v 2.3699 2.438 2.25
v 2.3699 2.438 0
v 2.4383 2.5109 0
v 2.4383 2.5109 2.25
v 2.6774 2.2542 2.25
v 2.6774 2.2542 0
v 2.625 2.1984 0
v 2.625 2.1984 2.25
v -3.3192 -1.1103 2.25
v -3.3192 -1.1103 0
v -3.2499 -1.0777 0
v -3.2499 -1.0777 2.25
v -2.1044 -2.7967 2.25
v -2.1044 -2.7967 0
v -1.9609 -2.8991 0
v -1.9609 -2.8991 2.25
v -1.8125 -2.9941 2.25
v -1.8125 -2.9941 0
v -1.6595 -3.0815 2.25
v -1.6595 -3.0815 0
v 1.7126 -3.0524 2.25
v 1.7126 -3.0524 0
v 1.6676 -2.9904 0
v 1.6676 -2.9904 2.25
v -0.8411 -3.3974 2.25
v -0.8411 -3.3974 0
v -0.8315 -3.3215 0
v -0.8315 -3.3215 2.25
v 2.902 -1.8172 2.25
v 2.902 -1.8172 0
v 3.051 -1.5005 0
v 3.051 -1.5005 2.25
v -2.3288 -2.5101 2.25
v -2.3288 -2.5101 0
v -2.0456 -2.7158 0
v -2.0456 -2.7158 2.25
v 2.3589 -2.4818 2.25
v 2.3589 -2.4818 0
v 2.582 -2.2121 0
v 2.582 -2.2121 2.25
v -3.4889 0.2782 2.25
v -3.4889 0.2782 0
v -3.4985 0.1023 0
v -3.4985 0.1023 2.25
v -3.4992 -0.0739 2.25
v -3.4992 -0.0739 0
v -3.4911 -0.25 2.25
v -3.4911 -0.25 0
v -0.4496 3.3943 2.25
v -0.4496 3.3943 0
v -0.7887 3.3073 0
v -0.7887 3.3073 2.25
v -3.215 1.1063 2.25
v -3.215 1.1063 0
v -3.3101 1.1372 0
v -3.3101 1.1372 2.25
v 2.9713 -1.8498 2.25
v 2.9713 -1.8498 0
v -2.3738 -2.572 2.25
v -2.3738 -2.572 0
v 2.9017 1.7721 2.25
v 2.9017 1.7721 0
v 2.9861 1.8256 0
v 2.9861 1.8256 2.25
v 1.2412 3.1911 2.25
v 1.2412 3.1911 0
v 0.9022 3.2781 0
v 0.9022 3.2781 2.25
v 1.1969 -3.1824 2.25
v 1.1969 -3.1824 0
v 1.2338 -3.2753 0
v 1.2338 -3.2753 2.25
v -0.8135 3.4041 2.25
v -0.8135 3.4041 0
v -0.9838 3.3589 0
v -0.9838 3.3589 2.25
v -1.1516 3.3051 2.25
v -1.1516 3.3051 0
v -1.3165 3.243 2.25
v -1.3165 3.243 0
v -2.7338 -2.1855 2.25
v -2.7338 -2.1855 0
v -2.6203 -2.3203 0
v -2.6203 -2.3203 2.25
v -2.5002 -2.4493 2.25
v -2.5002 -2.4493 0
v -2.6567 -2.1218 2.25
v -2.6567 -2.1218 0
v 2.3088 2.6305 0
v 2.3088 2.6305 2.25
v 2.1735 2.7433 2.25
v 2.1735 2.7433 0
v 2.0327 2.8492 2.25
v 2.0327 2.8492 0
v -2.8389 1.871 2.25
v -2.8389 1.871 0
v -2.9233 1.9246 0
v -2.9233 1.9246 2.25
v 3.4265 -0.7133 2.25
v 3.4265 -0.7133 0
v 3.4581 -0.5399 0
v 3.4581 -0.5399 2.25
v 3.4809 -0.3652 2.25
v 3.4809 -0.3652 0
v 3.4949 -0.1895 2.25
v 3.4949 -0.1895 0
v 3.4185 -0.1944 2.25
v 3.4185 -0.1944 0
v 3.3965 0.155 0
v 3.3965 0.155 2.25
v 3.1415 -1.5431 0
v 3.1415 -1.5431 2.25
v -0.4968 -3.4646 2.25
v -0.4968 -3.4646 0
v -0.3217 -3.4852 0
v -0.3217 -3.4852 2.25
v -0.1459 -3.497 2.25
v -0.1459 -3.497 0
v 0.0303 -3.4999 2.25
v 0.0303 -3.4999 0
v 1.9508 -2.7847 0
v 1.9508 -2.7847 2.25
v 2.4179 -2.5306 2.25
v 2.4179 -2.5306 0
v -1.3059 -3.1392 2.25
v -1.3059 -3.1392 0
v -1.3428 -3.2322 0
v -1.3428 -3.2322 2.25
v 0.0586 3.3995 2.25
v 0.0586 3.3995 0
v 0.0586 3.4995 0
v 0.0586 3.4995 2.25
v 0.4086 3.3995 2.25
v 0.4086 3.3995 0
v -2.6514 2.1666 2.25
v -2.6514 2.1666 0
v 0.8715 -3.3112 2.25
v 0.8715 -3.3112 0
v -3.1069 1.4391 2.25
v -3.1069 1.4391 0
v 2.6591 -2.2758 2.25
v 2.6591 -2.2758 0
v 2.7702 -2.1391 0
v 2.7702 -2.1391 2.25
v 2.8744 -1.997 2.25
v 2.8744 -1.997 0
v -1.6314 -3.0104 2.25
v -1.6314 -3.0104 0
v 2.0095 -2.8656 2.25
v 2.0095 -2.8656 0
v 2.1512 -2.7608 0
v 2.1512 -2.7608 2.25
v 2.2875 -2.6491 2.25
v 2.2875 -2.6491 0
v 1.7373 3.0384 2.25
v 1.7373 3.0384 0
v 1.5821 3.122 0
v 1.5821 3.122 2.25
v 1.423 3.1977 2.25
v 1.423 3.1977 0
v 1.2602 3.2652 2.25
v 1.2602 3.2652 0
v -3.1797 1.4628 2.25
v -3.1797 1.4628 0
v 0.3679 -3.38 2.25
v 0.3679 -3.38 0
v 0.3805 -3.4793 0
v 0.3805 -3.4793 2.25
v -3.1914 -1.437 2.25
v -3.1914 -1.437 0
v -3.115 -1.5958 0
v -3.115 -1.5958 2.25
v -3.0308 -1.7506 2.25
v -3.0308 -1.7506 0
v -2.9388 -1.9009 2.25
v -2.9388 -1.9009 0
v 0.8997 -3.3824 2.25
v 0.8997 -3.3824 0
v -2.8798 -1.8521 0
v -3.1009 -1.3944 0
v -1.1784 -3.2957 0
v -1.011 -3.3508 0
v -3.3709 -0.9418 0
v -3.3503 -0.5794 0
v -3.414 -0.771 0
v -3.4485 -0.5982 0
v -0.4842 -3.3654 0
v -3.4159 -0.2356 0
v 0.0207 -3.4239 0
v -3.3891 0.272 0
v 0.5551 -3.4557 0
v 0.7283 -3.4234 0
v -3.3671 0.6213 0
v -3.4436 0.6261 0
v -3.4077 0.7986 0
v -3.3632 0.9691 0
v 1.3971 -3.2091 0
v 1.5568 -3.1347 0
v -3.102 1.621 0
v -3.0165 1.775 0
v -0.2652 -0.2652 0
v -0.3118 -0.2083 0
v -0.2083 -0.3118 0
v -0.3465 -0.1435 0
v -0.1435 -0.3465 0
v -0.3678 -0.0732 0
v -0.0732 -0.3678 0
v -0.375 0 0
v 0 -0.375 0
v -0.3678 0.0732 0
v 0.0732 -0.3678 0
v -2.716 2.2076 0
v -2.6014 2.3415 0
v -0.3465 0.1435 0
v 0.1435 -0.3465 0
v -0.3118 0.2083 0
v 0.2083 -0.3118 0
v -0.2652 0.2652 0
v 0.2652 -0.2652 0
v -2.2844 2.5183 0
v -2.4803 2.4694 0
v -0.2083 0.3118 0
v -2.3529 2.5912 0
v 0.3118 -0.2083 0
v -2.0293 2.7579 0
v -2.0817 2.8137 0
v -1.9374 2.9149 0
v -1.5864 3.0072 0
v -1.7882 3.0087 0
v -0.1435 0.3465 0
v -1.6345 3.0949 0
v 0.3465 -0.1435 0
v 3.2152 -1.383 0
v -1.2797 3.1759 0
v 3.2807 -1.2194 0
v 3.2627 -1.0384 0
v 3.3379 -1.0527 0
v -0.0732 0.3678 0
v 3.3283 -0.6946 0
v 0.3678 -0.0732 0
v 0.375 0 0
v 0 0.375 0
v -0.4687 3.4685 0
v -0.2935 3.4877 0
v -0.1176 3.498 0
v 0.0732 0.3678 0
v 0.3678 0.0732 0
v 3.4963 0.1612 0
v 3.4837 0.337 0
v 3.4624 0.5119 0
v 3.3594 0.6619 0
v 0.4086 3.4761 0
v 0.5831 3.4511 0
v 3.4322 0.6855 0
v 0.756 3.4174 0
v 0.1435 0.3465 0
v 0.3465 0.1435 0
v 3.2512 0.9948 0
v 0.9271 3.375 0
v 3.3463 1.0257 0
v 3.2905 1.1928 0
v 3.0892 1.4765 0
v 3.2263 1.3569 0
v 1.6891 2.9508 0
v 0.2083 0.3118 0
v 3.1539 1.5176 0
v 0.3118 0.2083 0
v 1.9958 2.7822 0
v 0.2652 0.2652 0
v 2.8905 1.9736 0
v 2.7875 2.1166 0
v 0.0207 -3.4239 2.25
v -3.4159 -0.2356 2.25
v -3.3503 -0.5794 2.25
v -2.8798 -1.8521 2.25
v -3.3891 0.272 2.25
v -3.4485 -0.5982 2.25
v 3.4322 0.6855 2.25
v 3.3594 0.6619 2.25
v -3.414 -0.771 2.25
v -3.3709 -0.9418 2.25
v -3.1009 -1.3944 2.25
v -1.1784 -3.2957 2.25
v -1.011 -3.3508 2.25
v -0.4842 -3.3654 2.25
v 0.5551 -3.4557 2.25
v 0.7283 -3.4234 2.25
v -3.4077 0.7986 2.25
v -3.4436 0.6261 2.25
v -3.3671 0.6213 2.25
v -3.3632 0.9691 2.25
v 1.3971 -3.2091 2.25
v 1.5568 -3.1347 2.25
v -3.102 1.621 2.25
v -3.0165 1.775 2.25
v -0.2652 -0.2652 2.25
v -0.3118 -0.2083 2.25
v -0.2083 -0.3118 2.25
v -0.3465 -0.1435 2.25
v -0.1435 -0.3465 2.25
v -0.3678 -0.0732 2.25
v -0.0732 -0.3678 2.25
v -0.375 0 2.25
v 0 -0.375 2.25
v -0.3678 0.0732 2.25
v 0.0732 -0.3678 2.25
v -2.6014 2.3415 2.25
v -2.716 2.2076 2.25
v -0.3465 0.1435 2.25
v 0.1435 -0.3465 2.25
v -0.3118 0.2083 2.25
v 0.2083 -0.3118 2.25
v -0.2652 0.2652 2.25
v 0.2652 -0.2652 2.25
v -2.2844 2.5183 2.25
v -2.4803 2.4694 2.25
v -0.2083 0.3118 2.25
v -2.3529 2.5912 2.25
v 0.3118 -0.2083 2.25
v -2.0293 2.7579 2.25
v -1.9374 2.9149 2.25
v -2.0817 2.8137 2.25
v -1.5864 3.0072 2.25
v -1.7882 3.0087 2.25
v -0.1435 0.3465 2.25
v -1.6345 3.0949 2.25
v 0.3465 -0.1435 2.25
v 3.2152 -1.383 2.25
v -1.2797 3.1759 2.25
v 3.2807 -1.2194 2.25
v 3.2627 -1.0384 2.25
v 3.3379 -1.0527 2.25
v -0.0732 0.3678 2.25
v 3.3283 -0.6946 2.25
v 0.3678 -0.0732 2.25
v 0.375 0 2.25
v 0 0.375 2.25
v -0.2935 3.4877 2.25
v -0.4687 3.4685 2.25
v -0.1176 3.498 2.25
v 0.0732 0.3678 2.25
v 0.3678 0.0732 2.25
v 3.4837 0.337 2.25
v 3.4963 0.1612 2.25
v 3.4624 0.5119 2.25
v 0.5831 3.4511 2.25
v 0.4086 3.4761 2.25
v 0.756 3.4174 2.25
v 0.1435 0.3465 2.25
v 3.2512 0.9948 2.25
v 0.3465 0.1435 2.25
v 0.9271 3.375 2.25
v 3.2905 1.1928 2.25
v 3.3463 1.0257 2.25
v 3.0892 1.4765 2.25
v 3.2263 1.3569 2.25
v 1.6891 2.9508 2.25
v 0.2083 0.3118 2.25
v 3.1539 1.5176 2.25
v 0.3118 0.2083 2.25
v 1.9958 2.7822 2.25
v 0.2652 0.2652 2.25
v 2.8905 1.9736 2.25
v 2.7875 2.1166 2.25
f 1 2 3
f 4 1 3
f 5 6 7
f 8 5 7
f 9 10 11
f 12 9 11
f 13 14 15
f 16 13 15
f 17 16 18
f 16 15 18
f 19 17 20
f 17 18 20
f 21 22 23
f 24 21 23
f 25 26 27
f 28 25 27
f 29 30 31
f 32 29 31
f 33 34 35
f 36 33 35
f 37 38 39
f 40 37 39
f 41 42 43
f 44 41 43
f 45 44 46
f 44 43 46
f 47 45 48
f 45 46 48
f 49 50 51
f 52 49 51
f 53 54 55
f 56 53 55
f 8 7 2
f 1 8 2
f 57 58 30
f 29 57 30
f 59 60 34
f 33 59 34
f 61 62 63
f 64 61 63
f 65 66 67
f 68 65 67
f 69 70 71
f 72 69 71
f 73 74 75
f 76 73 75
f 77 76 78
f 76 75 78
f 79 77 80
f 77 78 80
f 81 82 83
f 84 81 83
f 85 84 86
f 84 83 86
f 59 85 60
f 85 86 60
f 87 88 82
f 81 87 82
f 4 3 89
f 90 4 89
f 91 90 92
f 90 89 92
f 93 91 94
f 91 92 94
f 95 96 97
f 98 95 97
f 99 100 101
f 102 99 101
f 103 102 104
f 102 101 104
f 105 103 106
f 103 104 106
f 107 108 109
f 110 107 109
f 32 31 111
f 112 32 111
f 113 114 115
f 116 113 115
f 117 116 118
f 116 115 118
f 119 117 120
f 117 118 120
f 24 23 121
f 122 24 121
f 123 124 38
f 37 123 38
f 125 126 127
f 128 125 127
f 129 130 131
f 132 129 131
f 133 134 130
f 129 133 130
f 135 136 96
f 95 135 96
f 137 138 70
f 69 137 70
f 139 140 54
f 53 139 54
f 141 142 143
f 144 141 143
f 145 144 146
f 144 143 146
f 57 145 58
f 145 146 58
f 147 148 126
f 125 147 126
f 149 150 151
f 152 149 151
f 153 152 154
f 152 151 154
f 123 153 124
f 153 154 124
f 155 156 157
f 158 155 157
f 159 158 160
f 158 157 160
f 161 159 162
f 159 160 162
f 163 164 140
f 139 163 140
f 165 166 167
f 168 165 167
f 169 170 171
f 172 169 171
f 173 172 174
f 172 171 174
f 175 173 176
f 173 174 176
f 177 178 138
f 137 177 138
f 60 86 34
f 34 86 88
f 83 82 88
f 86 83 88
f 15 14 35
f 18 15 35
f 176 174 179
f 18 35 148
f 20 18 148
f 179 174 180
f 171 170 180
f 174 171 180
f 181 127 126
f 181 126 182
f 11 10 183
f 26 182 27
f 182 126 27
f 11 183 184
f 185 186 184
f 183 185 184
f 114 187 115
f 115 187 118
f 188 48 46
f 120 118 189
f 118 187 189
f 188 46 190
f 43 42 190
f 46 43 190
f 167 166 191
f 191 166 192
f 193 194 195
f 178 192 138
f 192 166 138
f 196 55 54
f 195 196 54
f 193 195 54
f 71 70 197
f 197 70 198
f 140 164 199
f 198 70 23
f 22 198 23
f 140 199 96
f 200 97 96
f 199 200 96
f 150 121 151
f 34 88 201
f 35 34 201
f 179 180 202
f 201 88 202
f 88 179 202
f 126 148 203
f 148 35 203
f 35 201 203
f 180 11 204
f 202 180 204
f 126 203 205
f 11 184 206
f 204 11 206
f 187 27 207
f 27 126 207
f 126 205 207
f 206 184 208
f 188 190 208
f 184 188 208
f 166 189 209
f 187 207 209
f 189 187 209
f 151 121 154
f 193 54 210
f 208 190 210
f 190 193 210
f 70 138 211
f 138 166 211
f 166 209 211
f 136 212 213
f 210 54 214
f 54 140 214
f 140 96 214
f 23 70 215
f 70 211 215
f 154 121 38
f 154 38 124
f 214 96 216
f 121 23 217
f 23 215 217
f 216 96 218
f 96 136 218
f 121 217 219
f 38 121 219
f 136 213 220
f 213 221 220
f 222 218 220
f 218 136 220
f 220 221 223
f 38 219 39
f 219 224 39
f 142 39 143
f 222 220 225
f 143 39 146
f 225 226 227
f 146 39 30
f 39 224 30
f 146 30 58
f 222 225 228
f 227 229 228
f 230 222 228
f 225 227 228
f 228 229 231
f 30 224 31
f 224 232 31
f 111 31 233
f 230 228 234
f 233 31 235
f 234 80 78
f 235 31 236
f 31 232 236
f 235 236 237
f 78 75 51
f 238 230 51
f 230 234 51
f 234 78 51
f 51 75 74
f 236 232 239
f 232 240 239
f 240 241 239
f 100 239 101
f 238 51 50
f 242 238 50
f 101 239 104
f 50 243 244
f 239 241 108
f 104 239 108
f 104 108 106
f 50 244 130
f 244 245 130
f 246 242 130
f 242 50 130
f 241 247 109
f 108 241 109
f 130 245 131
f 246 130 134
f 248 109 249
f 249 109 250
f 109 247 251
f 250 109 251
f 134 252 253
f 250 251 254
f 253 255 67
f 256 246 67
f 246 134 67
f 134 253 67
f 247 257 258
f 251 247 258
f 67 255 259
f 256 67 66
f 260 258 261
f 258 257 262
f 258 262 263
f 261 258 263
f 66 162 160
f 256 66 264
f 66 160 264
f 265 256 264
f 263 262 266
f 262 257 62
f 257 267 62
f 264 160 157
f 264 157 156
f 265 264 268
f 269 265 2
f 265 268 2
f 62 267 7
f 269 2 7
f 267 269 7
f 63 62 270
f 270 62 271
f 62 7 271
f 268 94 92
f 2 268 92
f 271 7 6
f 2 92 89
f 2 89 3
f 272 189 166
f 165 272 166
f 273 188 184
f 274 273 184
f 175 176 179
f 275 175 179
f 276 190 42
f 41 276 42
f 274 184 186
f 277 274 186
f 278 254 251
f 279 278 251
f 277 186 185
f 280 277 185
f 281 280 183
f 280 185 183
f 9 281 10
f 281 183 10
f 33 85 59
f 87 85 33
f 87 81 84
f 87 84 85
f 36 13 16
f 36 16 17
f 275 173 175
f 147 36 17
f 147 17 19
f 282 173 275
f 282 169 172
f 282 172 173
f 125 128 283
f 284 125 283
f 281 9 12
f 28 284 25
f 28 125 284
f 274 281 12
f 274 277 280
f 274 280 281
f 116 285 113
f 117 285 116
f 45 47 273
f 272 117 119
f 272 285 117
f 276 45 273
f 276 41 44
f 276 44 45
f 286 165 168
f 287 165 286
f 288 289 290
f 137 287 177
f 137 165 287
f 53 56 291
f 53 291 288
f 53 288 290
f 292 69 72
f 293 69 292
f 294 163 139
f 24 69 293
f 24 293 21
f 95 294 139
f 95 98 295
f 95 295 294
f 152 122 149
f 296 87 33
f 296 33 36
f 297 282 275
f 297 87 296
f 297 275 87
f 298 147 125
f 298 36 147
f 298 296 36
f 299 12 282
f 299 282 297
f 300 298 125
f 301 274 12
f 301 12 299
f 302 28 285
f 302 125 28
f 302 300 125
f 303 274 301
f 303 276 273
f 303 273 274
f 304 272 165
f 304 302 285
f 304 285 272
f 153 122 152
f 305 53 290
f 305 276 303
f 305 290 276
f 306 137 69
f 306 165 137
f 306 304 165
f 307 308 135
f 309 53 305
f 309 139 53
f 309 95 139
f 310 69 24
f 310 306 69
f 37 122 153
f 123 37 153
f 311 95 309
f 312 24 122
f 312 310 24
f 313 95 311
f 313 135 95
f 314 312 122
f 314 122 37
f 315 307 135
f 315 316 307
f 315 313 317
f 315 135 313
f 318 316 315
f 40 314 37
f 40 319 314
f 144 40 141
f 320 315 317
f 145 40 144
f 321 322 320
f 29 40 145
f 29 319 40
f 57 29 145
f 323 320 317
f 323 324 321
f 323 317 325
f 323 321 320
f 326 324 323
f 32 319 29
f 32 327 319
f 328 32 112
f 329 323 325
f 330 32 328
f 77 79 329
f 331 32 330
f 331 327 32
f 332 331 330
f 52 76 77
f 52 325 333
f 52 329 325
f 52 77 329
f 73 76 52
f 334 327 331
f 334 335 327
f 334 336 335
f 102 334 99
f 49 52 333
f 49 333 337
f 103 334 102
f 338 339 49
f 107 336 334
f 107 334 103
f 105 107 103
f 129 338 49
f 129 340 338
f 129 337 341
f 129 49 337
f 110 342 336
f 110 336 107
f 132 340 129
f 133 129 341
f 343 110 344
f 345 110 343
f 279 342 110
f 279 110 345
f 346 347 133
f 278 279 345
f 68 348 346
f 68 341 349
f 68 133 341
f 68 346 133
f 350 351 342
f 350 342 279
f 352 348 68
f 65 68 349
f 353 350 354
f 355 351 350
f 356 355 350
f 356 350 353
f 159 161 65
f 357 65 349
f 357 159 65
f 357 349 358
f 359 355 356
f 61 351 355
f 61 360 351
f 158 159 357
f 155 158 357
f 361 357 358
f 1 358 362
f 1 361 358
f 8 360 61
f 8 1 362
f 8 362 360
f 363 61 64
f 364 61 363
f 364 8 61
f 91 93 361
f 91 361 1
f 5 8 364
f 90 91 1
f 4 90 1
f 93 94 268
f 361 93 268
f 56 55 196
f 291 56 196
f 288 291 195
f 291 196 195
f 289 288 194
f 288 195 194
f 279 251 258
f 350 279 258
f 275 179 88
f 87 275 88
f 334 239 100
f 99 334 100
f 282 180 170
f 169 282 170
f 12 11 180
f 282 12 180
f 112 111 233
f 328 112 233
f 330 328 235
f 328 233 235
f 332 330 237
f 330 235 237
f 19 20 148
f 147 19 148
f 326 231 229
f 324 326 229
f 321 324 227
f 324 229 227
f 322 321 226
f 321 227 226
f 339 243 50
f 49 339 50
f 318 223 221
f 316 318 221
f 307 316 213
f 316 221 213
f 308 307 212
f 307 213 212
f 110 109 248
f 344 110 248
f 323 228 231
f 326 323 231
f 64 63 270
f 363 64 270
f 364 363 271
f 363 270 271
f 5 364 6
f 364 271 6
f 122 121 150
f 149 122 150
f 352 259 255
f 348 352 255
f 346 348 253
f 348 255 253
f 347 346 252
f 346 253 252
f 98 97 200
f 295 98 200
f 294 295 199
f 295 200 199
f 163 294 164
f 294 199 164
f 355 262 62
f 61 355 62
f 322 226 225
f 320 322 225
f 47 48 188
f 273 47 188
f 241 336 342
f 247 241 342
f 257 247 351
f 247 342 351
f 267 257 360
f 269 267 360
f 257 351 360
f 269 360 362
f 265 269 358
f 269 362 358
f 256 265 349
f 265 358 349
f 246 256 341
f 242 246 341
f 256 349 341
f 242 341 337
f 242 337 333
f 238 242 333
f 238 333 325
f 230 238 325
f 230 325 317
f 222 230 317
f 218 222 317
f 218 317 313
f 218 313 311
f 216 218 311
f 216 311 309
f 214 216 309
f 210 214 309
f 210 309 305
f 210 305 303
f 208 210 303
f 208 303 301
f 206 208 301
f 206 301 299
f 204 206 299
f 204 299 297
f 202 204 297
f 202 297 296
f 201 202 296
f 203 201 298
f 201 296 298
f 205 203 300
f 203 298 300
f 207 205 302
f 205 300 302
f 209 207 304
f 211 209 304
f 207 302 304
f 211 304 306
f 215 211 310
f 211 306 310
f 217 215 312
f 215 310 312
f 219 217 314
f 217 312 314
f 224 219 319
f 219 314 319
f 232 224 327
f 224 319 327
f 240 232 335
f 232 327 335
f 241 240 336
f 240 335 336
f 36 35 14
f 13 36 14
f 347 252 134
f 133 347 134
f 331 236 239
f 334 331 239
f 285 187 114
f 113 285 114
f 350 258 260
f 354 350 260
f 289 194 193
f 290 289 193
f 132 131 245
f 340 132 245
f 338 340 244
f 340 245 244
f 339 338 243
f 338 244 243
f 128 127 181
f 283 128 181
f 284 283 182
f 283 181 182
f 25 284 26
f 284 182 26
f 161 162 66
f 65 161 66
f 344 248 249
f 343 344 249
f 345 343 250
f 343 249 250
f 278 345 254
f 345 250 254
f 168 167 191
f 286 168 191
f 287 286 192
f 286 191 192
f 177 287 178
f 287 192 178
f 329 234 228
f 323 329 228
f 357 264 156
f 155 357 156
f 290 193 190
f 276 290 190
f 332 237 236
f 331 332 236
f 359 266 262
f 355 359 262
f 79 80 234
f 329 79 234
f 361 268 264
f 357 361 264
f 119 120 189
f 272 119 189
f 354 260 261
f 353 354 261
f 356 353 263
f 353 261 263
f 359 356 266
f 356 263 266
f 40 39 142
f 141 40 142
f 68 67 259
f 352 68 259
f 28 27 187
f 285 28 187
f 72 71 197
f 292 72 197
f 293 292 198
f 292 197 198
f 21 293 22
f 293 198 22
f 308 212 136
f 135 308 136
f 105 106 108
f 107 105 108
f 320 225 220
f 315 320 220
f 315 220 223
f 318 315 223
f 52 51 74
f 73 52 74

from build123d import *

# Parameters (mm, degrees)
F1_DEPTH = 2.25
F2_R     = 0.375
F3_DEPTH = 2.251


with BuildPart() as f1:
    # F0 (on Top) → F1 (new body)
    with BuildSketch(Plane.XY):
        with BuildLine():
            Line((3.396481, 0.154959), (3.496284, 0.161238))
            ThreePointArc((3.496284, 0.161238), (3.474149, 0.424604), (3.432204, 0.685549))
            Line((3.432204, 0.685549), (3.359394, 0.661892))
            Line((3.359394, 0.661892), (3.251238, 0.994762))
            Line((3.251238, 0.994762), (3.346343, 1.025663))
            ThreePointArc((3.346343, 1.025663), (3.259407, 1.27525), (3.153886, 1.517566))
            Line((3.153886, 1.517566), (3.089246, 1.476545))
            Line((3.089246, 1.476545), (2.901707, 1.772059))
            Line((2.901707, 1.772059), (2.98614, 1.825642))
            ThreePointArc((2.98614, 1.825642), (2.839865, 2.045768), (2.677397, 2.254228))
            Line((2.677397, 2.254228), (2.62499, 2.198421))
            Line((2.62499, 2.198421), (2.369851, 2.438012))
            Line((2.369851, 2.438012), (2.438306, 2.510909))
            ThreePointArc((2.438306, 2.510909), (2.241884, 2.687742), (2.032678, 2.849249))
            Line((2.032678, 2.849249), (1.995797, 2.782162))
            Line((1.995797, 2.782162), (1.689089, 2.950775))
            Line((1.689089, 2.950775), (1.737265, 3.038406))
            ThreePointArc((1.737265, 3.038406), (1.503037, 3.160835), (1.260238, 3.265241))
            Line((1.260238, 3.265241), (1.241199, 3.191089))
            Line((1.241199, 3.191089), (0.902195, 3.278131))
            Line((0.902195, 3.278131), (0.927064, 3.374989))
            ThreePointArc((0.927064, 3.374989), (0.669748, 3.435322), (0.408613, 3.476066))
            Line((0.408613, 3.476066), (0.408613, 3.399509))
            Line((0.408613, 3.399509), (0.058613, 3.399509))
            Line((0.058613, 3.399509), (0.058613, 3.499509))
            ThreePointArc((0.058613, 3.499509), (-0.205623, 3.493955), (-0.468687, 3.468477))
            Line((-0.468687, 3.468477), (-0.449648, 3.394325))
            Line((-0.449648, 3.394325), (-0.788652, 3.307284))
            Line((-0.788652, 3.307284), (-0.813521, 3.404142))
            ThreePointArc((-0.813521, 3.404142), (-1.068074, 3.333049), (-1.316537, 3.242951))
            Line((-1.316537, 3.242951), (-1.279656, 3.175864))
            Line((-1.279656, 3.175864), (-1.586363, 3.00725))
            Line((-1.586363, 3.00725), (-1.634538, 3.09488))
            ThreePointArc((-1.634538, 3.09488), (-1.863414, 2.962716), (-2.081665, 2.813658))
            Line((-2.081665, 2.813658), (-2.029258, 2.757851))
            Line((-2.029258, 2.757851), (-2.284397, 2.518259))
            Line((-2.284397, 2.518259), (-2.352852, 2.591156))
            ThreePointArc((-2.352852, 2.591156), (-2.541669, 2.406225), (-2.715994, 2.207573))
            Line((-2.715994, 2.207573), (-2.651355, 2.166552))
            Line((-2.651355, 2.166552), (-2.838894, 1.871037))
            Line((-2.838894, 1.871037), (-2.923327, 1.92462))
            ThreePointArc((-2.923327, 1.92462), (-3.060222, 1.698541), (-3.179667, 1.462778))
            Line((-3.179667, 1.462778), (-3.106857, 1.43912))
            Line((-3.106857, 1.43912), (-3.215013, 1.106251))
            Line((-3.215013, 1.106251), (-3.310119, 1.137152))
            ThreePointArc((-3.310119, 1.137152), (-3.386489, 0.884132), (-3.44355, 0.626071))
            Line((-3.44355, 0.626071), (-3.367144, 0.621264))
            Line((-3.367144, 0.621264), (-3.389121, 0.271954))
            Line((-3.389121, 0.271954), (-3.488923, 0.278234))
            ThreePointArc((-3.488923, 0.278234), (-3.499971, 0.01417), (-3.491062, -0.249974))
            Line((-3.491062, -0.249974), (-3.415861, -0.235629))
            Line((-3.415861, -0.235629), (-3.350278, -0.579429))
            Line((-3.350278, -0.579429), (-3.448506, -0.598168))
            ThreePointArc((-3.448506, -0.598168), (-3.393537, -0.856683), (-3.319218, -1.110313))
            Line((-3.319218, -1.110313), (-3.249947, -1.077716))
            Line((-3.249947, -1.077716), (-3.100924, -1.394406))
            Line((-3.100924, -1.394406), (-3.191407, -1.436984))
            ThreePointArc((-3.191407, -1.436984), (-3.073875, -1.673707), (-2.938815, -1.900886))
            Line((-2.938815, -1.900886), (-2.879827, -1.852087))
            Line((-2.879827, -1.852087), (-2.656728, -2.121766))
            Line((-2.656728, -2.121766), (-2.73378, -2.185509))
            ThreePointArc((-2.73378, -2.185509), (-2.561069, -2.385566), (-2.373755, -2.57202))
            Line((-2.373755, -2.57202), (-2.328756, -2.510084))
            Line((-2.328756, -2.510084), (-2.0456, -2.715809))
            Line((-2.0456, -2.715809), (-2.104379, -2.79671))
            ThreePointArc((-2.104379, -2.79671), (-1.887343, -2.947531), (-1.659544, -3.081544))
            Line((-1.659544, -3.081544), (-1.631362, -3.010363))
            Line((-1.631362, -3.010363), (-1.30594, -3.139207))
            Line((-1.30594, -3.139207), (-1.342752, -3.232184))
            ThreePointArc((-1.342752, -3.232184), (-1.095027, -3.324292), (-0.841058, -3.397443))
            Line((-0.841058, -3.397443), (-0.831463, -3.32149))
            Line((-0.831463, -3.32149), (-0.484223, -3.365357))
            Line((-0.484223, -3.365357), (-0.496756, -3.464568))
            ThreePointArc((-0.496756, -3.464568), (-0.233907, -3.492175), (0.030275, -3.499869))
            Line((0.030275, -3.499869), (0.02068, -3.423916))
            Line((0.02068, -3.423916), (0.36792, -3.380049))
            Line((0.36792, -3.380049), (0.380454, -3.479261))
            ThreePointArc((0.380454, -3.479261), (0.64191, -3.440632), (0.899706, -3.382385))
            Line((0.899706, -3.382385), (0.871524, -3.311204))
            Line((0.871524, -3.311204), (1.196946, -3.182361))
            Line((1.196946, -3.182361), (1.233758, -3.275338))
            ThreePointArc((1.233758, -3.275338), (1.477394, -3.172902), (1.712605, -3.052373))
            Line((1.712605, -3.052373), (1.667606, -2.990438))
            Line((1.667606, -2.990438), (1.950762, -2.784713))
            Line((1.950762, -2.784713), (2.009541, -2.865614))
            ThreePointArc((2.009541, -2.865614), (2.220047, -2.705807), (2.417895, -2.53057))
            Line((2.417895, -2.53057), (2.358907, -2.481771))
            Line((2.358907, -2.481771), (2.582005, -2.212091))
            Line((2.582005, -2.212091), (2.659057, -2.275833))
            ThreePointArc((2.659057, -2.275833), (2.823207, -2.068695), (2.97126, -1.849761))
            Line((2.97126, -1.849761), (2.901989, -1.817165))
            Line((2.901989, -1.817165), (3.051012, -1.500475))
            Line((3.051012, -1.500475), (3.141494, -1.543053))
            ThreePointArc((3.141494, -1.543053), (3.248975, -1.3016), (3.337929, -1.052725))
            Line((3.337929, -1.052725), (3.262728, -1.03838))
            Line((3.262728, -1.03838), (3.328312, -0.69458))
            Line((3.328312, -0.69458), (3.42654, -0.713318))
            ThreePointArc((3.42654, -0.713318), (3.470597, -0.452721), (3.494864, -0.189543))
            Line((3.494864, -0.189543), (3.418458, -0.19435))
            Line((3.418458, -0.19435), (3.396481, 0.154959))
        make_face()
    extrude(amount=F1_DEPTH)

    # F2 (on face) → F3 (cut, through all)
    with BuildSketch(Plane.XY.offset(2.25)):
        Circle(F2_R)
    extrude(amount=-F3_DEPTH, mode=Mode.SUBTRACT)


solid = f1.part
